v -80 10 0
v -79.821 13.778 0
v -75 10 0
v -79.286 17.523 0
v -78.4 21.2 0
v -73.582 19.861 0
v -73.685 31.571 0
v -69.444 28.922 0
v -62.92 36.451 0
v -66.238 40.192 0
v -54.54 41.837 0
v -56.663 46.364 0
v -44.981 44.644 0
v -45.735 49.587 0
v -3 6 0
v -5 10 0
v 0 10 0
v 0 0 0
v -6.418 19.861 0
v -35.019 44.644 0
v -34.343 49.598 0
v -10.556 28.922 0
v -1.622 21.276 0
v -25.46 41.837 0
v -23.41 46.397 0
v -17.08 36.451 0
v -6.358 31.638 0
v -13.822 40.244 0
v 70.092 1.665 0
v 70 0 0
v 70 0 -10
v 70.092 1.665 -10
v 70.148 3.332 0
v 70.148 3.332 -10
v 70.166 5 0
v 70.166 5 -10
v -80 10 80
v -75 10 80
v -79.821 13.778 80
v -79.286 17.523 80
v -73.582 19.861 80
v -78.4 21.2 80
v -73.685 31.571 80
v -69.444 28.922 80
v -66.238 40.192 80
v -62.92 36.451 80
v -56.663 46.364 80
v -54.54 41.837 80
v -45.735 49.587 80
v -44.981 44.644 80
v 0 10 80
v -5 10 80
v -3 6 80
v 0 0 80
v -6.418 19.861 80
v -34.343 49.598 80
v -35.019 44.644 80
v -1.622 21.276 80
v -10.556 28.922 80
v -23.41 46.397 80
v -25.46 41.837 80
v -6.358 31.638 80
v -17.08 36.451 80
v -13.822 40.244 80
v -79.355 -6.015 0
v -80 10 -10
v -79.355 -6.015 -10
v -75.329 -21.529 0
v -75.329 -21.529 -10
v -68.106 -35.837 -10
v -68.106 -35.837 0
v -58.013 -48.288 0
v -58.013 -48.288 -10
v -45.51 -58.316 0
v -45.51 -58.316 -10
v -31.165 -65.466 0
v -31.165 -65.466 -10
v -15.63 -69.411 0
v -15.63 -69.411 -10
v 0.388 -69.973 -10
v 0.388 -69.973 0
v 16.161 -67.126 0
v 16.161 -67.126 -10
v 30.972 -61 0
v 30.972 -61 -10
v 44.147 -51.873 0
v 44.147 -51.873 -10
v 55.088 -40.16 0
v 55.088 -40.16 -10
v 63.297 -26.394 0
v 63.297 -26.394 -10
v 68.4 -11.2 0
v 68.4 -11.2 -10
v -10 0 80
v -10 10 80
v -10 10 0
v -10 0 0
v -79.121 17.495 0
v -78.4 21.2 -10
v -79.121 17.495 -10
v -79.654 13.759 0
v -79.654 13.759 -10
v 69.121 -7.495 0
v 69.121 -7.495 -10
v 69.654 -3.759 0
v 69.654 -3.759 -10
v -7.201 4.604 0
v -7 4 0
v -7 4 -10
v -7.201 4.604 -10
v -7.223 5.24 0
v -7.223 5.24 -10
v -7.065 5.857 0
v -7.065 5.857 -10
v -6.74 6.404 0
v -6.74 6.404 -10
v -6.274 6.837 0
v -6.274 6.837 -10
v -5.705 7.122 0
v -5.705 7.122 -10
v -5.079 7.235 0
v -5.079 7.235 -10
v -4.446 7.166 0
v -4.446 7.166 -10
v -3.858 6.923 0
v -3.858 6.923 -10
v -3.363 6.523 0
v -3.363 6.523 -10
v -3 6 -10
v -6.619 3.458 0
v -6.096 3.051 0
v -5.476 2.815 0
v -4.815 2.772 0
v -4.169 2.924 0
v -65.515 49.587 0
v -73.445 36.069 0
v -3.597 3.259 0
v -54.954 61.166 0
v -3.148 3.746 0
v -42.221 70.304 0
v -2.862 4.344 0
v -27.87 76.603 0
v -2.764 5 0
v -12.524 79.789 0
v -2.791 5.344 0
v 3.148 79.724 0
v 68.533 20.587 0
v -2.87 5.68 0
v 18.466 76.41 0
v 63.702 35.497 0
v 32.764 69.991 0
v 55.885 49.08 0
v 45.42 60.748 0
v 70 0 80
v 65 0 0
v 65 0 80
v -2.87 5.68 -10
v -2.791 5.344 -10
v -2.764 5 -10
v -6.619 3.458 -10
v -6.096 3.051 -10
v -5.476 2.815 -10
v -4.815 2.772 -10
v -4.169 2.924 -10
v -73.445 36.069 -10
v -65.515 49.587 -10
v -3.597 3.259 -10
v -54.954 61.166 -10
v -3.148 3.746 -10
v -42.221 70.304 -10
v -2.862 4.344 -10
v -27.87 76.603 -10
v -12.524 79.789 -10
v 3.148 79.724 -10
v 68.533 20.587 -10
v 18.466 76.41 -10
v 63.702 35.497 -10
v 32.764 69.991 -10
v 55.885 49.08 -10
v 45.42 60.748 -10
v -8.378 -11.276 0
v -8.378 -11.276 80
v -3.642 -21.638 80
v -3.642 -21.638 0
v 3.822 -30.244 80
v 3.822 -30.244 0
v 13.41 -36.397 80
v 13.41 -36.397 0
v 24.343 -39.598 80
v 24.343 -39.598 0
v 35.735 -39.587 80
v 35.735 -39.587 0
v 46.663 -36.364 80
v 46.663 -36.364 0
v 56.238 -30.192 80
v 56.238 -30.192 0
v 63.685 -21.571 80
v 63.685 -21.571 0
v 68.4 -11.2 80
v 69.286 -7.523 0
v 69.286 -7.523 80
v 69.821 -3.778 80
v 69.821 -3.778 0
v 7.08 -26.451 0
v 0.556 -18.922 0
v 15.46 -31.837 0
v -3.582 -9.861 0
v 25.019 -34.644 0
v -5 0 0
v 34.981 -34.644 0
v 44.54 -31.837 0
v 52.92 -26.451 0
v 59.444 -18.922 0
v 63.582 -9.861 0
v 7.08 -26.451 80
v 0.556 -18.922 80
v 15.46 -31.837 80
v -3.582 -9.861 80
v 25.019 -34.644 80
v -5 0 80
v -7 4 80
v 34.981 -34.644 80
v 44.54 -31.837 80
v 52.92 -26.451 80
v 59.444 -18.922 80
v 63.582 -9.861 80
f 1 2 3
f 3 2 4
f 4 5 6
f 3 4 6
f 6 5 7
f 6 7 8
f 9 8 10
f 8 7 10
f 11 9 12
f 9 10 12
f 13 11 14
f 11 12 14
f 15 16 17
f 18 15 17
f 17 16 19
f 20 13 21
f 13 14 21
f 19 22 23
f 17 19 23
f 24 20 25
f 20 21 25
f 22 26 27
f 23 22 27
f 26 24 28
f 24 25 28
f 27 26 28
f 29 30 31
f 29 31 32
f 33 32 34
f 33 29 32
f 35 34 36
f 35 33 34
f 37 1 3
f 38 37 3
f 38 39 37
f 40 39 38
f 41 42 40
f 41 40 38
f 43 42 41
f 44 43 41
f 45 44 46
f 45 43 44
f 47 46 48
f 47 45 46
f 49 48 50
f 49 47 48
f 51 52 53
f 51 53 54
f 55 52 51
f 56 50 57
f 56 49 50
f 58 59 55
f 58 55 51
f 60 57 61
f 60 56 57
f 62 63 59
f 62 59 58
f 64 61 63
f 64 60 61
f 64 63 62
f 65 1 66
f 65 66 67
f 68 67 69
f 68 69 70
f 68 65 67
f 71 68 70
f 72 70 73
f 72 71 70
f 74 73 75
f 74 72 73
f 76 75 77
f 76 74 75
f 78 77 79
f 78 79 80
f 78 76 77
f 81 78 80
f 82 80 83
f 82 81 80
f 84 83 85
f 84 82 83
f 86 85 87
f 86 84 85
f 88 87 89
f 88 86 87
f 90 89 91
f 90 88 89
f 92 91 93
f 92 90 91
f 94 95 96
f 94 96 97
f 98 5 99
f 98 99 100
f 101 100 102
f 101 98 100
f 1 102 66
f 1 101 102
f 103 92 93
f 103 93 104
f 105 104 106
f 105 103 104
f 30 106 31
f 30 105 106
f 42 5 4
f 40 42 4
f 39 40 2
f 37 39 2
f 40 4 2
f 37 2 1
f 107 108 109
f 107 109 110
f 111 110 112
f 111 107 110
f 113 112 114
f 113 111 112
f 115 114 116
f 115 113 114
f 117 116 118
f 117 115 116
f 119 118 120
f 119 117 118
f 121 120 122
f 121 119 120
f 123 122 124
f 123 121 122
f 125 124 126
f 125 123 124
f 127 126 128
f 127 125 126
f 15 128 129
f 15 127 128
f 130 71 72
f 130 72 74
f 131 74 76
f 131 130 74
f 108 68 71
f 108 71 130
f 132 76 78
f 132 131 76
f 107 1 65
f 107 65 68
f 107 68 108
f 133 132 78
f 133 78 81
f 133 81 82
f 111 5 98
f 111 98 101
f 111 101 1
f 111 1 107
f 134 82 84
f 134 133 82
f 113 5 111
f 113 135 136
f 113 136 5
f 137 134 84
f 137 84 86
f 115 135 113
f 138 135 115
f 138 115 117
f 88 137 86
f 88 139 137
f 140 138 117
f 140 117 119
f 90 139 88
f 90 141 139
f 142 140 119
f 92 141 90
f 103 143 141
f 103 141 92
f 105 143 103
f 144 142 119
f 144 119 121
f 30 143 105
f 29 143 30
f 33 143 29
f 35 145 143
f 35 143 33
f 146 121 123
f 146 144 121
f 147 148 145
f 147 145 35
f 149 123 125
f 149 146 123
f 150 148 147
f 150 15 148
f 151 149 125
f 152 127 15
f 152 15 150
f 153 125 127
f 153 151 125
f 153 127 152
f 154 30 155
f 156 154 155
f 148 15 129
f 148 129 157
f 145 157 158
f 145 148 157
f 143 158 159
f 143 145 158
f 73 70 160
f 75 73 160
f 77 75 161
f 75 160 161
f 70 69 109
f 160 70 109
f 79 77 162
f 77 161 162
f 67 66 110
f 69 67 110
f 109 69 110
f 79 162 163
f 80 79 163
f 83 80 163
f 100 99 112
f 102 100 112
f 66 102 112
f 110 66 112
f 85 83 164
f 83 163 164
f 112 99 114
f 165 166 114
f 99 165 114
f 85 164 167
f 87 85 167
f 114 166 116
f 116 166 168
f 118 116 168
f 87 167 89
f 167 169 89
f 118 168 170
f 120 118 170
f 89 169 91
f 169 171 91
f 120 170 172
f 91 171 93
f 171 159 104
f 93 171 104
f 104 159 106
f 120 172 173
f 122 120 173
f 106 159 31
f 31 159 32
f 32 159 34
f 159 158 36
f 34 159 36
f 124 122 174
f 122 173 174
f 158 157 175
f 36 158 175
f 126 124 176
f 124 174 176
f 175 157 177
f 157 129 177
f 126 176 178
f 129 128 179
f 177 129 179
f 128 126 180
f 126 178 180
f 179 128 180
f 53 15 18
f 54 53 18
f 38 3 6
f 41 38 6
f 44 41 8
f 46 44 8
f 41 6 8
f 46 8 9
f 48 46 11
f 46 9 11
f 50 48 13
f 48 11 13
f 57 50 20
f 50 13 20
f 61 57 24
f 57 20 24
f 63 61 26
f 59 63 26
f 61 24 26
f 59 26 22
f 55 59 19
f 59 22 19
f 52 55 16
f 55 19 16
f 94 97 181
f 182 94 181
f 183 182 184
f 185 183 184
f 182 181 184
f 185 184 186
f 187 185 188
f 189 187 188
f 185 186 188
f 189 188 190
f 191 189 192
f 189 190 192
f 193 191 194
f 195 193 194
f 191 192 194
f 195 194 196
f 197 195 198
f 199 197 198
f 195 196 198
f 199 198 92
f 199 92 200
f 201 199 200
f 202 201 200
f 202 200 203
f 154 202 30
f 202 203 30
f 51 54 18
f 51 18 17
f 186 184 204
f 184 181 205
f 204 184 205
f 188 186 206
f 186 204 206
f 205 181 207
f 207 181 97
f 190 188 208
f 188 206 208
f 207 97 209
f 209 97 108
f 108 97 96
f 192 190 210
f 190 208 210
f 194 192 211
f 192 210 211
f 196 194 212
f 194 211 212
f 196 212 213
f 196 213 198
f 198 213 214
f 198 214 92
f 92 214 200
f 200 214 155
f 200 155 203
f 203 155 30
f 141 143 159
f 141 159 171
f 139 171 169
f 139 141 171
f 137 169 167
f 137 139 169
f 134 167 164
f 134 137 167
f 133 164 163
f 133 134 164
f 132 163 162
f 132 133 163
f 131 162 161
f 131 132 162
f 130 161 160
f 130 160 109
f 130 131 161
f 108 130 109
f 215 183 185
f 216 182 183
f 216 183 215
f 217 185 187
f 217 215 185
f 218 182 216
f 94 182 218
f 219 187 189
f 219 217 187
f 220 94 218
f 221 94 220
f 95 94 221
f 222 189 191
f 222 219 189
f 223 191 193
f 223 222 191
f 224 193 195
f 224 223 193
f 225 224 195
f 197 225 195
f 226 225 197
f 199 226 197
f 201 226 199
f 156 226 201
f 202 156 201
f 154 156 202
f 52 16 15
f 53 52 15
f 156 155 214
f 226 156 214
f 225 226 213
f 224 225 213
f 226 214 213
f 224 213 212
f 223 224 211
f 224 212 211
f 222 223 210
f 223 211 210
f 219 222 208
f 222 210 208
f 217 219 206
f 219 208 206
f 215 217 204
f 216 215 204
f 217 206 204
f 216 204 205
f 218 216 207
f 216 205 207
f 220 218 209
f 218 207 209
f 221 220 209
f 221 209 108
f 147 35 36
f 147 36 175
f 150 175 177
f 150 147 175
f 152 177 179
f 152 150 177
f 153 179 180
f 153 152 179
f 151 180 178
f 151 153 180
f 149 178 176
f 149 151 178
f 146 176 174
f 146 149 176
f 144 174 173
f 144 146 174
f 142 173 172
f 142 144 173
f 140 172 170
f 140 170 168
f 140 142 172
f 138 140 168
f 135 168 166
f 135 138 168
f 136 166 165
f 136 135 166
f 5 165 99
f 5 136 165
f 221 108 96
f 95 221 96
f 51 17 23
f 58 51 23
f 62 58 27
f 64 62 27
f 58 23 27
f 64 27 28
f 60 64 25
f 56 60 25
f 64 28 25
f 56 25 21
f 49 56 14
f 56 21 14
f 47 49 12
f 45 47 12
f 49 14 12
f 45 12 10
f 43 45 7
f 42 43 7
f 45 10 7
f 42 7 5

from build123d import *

# Parameters (mm, degrees)
F1_DEPTH = 80
F2_DEPTH = 10


with BuildPart() as f1:
    # F0 (on Top) → F1 (new body)
    with BuildSketch(Plane.XY):
        with BuildLine():
            ThreePointArc((65, 0), (30, -35), (-5, 0))
            Line((-5, 0), (-10, 0))
            ThreePointArc((-10, 0), (24.3431457505, -39.5979797464), (68.4, -11.2))
            ThreePointArc((68.4, -11.2), (69.4110206891, -5.6301458127), (70, 0))
            Line((70, 0), (65, 0))
        make_face()
        with BuildLine():
            ThreePointArc((68.4, -11.2), (69.5979797464, -5.6568542495), (70, 0))
            ThreePointArc((70, 0), (69.4110206891, -5.6301458127), (68.4, -11.2))
        make_face()
        Polygon((-10, 0), (-5, 0), (-7.0000000016, 4.0000000031), (-10, 10), align=None)
    extrude(amount=F1_DEPTH)


with BuildPart() as f1b:
    # F0 (on Top) → F1, piece 2 (new body)
    with BuildSketch(Plane.XY):
        with BuildLine():
            Line((-5, 10), (0, 10))
            ThreePointArc((0, 10), (-34.3431457505, 49.5979797464), (-78.4, 21.2))
            ThreePointArc((-78.4, 21.2), (-79.4110206891, 15.6301458127), (-80, 10))
            Line((-80, 10), (-75, 10))
            ThreePointArc((-75, 10), (-40, 45), (-5, 10))
        make_face()
        with BuildLine():
            ThreePointArc((-80, 10), (-79.4110206891, 15.6301458127), (-78.4, 21.2))
            ThreePointArc((-78.4, 21.2), (-79.5979797464, 15.6568542495), (-80, 10))
        make_face()
        Polygon((-2.9999999957, 5.9999999915), (0, 0), (0, 10), (-5, 10), align=None)
    extrude(amount=F1_DEPTH)


with BuildPart() as f2:
    # F0 (on Top) → F2 (new body)
    with BuildSketch(Plane.XY):
        with BuildLine():
            ThreePointArc((68.4, -11.2), (24.3431457505, -39.5979797464), (-10, 0))
            Line((-10, 0), (-10, 10))
            Line((-10, 10), (-75, 10))
            Line((-75, 10), (-80, 10))
            ThreePointArc((-80, 10), (-15.6301458127, -69.4110206891), (68.4, -11.2))
        make_face()
        with BuildLine():
            Line((0, 10), (0, 0))
            Line((0, 0), (65, 0))
            Line((65, 0), (70, 0))
            ThreePointArc((70, 0), (70.1248498897, 2.4986145729), (70.1664818919, 5))
            ThreePointArc((70.1664818919, 5), (3.1480129215, 79.7235564292), (-78.4, 21.2))
            ThreePointArc((-78.4, 21.2), (-34.3431457505, 49.5979797464), (0, 10))
        make_face()
        with BuildLine():
            Line((-10, 10), (-5, 10))
            ThreePointArc((-5, 10), (-40, 45), (-75, 10))
            Line((-75, 10), (-10, 10))
        make_face()
        with BuildLine():
            Line((65, 0), (0, 0))
            Line((0, 0), (-5, 0))
            ThreePointArc((-5, 0), (30, -35), (65, 0))
        make_face()
        with BuildLine():
            Line((-5, 10), (0, 10))
            ThreePointArc((0, 10), (-34.3431457505, 49.5979797464), (-78.4, 21.2))
            ThreePointArc((-78.4, 21.2), (-79.4110206891, 15.6301458127), (-80, 10))
            Line((-80, 10), (-75, 10))
            ThreePointArc((-75, 10), (-40, 45), (-5, 10))
        make_face()
        with BuildLine():
            ThreePointArc((65, 0), (30, -35), (-5, 0))
            Line((-5, 0), (-10, 0))
            ThreePointArc((-10, 0), (24.3431457505, -39.5979797464), (68.4, -11.2))
            ThreePointArc((68.4, -11.2), (69.4110206891, -5.6301458127), (70, 0))
            Line((70, 0), (65, 0))
        make_face()
        with BuildLine():
            Line((-5, 0), (0, 0))
            Line((0, 0), (-2.9999999957, 5.9999999915))
            ThreePointArc((-2.9999999957, 5.9999999915), (-2.8237490994, 5.5137431437), (-2.7639320225, 5))
            ThreePointArc((-2.7639320225, 5), (-4.4862568533, 2.8237491001), (-7.0000000016, 4.0000000031))
            Line((-7.0000000016, 4.0000000031), (-5, 0))
        make_face()
        with BuildLine():
            ThreePointArc((-7.0000000016, 4.0000000031), (-5.9999999942, 7.0000000029), (-2.9999999957, 5.9999999915))
            Line((-2.9999999957, 5.9999999915), (-5, 10))
            Line((-5, 10), (-10, 10))
            Line((-10, 10), (-7.0000000016, 4.0000000031))
        make_face()
        Polygon((-10, 0), (-5, 0), (-7.0000000016, 4.0000000031), (-10, 10), align=None)
        Polygon((-2.9999999957, 5.9999999915), (0, 0), (0, 10), (-5, 10), align=None)
    extrude(amount=-F2_DEPTH)


solid = Compound([f1.part, f1b.part, f2.part])
